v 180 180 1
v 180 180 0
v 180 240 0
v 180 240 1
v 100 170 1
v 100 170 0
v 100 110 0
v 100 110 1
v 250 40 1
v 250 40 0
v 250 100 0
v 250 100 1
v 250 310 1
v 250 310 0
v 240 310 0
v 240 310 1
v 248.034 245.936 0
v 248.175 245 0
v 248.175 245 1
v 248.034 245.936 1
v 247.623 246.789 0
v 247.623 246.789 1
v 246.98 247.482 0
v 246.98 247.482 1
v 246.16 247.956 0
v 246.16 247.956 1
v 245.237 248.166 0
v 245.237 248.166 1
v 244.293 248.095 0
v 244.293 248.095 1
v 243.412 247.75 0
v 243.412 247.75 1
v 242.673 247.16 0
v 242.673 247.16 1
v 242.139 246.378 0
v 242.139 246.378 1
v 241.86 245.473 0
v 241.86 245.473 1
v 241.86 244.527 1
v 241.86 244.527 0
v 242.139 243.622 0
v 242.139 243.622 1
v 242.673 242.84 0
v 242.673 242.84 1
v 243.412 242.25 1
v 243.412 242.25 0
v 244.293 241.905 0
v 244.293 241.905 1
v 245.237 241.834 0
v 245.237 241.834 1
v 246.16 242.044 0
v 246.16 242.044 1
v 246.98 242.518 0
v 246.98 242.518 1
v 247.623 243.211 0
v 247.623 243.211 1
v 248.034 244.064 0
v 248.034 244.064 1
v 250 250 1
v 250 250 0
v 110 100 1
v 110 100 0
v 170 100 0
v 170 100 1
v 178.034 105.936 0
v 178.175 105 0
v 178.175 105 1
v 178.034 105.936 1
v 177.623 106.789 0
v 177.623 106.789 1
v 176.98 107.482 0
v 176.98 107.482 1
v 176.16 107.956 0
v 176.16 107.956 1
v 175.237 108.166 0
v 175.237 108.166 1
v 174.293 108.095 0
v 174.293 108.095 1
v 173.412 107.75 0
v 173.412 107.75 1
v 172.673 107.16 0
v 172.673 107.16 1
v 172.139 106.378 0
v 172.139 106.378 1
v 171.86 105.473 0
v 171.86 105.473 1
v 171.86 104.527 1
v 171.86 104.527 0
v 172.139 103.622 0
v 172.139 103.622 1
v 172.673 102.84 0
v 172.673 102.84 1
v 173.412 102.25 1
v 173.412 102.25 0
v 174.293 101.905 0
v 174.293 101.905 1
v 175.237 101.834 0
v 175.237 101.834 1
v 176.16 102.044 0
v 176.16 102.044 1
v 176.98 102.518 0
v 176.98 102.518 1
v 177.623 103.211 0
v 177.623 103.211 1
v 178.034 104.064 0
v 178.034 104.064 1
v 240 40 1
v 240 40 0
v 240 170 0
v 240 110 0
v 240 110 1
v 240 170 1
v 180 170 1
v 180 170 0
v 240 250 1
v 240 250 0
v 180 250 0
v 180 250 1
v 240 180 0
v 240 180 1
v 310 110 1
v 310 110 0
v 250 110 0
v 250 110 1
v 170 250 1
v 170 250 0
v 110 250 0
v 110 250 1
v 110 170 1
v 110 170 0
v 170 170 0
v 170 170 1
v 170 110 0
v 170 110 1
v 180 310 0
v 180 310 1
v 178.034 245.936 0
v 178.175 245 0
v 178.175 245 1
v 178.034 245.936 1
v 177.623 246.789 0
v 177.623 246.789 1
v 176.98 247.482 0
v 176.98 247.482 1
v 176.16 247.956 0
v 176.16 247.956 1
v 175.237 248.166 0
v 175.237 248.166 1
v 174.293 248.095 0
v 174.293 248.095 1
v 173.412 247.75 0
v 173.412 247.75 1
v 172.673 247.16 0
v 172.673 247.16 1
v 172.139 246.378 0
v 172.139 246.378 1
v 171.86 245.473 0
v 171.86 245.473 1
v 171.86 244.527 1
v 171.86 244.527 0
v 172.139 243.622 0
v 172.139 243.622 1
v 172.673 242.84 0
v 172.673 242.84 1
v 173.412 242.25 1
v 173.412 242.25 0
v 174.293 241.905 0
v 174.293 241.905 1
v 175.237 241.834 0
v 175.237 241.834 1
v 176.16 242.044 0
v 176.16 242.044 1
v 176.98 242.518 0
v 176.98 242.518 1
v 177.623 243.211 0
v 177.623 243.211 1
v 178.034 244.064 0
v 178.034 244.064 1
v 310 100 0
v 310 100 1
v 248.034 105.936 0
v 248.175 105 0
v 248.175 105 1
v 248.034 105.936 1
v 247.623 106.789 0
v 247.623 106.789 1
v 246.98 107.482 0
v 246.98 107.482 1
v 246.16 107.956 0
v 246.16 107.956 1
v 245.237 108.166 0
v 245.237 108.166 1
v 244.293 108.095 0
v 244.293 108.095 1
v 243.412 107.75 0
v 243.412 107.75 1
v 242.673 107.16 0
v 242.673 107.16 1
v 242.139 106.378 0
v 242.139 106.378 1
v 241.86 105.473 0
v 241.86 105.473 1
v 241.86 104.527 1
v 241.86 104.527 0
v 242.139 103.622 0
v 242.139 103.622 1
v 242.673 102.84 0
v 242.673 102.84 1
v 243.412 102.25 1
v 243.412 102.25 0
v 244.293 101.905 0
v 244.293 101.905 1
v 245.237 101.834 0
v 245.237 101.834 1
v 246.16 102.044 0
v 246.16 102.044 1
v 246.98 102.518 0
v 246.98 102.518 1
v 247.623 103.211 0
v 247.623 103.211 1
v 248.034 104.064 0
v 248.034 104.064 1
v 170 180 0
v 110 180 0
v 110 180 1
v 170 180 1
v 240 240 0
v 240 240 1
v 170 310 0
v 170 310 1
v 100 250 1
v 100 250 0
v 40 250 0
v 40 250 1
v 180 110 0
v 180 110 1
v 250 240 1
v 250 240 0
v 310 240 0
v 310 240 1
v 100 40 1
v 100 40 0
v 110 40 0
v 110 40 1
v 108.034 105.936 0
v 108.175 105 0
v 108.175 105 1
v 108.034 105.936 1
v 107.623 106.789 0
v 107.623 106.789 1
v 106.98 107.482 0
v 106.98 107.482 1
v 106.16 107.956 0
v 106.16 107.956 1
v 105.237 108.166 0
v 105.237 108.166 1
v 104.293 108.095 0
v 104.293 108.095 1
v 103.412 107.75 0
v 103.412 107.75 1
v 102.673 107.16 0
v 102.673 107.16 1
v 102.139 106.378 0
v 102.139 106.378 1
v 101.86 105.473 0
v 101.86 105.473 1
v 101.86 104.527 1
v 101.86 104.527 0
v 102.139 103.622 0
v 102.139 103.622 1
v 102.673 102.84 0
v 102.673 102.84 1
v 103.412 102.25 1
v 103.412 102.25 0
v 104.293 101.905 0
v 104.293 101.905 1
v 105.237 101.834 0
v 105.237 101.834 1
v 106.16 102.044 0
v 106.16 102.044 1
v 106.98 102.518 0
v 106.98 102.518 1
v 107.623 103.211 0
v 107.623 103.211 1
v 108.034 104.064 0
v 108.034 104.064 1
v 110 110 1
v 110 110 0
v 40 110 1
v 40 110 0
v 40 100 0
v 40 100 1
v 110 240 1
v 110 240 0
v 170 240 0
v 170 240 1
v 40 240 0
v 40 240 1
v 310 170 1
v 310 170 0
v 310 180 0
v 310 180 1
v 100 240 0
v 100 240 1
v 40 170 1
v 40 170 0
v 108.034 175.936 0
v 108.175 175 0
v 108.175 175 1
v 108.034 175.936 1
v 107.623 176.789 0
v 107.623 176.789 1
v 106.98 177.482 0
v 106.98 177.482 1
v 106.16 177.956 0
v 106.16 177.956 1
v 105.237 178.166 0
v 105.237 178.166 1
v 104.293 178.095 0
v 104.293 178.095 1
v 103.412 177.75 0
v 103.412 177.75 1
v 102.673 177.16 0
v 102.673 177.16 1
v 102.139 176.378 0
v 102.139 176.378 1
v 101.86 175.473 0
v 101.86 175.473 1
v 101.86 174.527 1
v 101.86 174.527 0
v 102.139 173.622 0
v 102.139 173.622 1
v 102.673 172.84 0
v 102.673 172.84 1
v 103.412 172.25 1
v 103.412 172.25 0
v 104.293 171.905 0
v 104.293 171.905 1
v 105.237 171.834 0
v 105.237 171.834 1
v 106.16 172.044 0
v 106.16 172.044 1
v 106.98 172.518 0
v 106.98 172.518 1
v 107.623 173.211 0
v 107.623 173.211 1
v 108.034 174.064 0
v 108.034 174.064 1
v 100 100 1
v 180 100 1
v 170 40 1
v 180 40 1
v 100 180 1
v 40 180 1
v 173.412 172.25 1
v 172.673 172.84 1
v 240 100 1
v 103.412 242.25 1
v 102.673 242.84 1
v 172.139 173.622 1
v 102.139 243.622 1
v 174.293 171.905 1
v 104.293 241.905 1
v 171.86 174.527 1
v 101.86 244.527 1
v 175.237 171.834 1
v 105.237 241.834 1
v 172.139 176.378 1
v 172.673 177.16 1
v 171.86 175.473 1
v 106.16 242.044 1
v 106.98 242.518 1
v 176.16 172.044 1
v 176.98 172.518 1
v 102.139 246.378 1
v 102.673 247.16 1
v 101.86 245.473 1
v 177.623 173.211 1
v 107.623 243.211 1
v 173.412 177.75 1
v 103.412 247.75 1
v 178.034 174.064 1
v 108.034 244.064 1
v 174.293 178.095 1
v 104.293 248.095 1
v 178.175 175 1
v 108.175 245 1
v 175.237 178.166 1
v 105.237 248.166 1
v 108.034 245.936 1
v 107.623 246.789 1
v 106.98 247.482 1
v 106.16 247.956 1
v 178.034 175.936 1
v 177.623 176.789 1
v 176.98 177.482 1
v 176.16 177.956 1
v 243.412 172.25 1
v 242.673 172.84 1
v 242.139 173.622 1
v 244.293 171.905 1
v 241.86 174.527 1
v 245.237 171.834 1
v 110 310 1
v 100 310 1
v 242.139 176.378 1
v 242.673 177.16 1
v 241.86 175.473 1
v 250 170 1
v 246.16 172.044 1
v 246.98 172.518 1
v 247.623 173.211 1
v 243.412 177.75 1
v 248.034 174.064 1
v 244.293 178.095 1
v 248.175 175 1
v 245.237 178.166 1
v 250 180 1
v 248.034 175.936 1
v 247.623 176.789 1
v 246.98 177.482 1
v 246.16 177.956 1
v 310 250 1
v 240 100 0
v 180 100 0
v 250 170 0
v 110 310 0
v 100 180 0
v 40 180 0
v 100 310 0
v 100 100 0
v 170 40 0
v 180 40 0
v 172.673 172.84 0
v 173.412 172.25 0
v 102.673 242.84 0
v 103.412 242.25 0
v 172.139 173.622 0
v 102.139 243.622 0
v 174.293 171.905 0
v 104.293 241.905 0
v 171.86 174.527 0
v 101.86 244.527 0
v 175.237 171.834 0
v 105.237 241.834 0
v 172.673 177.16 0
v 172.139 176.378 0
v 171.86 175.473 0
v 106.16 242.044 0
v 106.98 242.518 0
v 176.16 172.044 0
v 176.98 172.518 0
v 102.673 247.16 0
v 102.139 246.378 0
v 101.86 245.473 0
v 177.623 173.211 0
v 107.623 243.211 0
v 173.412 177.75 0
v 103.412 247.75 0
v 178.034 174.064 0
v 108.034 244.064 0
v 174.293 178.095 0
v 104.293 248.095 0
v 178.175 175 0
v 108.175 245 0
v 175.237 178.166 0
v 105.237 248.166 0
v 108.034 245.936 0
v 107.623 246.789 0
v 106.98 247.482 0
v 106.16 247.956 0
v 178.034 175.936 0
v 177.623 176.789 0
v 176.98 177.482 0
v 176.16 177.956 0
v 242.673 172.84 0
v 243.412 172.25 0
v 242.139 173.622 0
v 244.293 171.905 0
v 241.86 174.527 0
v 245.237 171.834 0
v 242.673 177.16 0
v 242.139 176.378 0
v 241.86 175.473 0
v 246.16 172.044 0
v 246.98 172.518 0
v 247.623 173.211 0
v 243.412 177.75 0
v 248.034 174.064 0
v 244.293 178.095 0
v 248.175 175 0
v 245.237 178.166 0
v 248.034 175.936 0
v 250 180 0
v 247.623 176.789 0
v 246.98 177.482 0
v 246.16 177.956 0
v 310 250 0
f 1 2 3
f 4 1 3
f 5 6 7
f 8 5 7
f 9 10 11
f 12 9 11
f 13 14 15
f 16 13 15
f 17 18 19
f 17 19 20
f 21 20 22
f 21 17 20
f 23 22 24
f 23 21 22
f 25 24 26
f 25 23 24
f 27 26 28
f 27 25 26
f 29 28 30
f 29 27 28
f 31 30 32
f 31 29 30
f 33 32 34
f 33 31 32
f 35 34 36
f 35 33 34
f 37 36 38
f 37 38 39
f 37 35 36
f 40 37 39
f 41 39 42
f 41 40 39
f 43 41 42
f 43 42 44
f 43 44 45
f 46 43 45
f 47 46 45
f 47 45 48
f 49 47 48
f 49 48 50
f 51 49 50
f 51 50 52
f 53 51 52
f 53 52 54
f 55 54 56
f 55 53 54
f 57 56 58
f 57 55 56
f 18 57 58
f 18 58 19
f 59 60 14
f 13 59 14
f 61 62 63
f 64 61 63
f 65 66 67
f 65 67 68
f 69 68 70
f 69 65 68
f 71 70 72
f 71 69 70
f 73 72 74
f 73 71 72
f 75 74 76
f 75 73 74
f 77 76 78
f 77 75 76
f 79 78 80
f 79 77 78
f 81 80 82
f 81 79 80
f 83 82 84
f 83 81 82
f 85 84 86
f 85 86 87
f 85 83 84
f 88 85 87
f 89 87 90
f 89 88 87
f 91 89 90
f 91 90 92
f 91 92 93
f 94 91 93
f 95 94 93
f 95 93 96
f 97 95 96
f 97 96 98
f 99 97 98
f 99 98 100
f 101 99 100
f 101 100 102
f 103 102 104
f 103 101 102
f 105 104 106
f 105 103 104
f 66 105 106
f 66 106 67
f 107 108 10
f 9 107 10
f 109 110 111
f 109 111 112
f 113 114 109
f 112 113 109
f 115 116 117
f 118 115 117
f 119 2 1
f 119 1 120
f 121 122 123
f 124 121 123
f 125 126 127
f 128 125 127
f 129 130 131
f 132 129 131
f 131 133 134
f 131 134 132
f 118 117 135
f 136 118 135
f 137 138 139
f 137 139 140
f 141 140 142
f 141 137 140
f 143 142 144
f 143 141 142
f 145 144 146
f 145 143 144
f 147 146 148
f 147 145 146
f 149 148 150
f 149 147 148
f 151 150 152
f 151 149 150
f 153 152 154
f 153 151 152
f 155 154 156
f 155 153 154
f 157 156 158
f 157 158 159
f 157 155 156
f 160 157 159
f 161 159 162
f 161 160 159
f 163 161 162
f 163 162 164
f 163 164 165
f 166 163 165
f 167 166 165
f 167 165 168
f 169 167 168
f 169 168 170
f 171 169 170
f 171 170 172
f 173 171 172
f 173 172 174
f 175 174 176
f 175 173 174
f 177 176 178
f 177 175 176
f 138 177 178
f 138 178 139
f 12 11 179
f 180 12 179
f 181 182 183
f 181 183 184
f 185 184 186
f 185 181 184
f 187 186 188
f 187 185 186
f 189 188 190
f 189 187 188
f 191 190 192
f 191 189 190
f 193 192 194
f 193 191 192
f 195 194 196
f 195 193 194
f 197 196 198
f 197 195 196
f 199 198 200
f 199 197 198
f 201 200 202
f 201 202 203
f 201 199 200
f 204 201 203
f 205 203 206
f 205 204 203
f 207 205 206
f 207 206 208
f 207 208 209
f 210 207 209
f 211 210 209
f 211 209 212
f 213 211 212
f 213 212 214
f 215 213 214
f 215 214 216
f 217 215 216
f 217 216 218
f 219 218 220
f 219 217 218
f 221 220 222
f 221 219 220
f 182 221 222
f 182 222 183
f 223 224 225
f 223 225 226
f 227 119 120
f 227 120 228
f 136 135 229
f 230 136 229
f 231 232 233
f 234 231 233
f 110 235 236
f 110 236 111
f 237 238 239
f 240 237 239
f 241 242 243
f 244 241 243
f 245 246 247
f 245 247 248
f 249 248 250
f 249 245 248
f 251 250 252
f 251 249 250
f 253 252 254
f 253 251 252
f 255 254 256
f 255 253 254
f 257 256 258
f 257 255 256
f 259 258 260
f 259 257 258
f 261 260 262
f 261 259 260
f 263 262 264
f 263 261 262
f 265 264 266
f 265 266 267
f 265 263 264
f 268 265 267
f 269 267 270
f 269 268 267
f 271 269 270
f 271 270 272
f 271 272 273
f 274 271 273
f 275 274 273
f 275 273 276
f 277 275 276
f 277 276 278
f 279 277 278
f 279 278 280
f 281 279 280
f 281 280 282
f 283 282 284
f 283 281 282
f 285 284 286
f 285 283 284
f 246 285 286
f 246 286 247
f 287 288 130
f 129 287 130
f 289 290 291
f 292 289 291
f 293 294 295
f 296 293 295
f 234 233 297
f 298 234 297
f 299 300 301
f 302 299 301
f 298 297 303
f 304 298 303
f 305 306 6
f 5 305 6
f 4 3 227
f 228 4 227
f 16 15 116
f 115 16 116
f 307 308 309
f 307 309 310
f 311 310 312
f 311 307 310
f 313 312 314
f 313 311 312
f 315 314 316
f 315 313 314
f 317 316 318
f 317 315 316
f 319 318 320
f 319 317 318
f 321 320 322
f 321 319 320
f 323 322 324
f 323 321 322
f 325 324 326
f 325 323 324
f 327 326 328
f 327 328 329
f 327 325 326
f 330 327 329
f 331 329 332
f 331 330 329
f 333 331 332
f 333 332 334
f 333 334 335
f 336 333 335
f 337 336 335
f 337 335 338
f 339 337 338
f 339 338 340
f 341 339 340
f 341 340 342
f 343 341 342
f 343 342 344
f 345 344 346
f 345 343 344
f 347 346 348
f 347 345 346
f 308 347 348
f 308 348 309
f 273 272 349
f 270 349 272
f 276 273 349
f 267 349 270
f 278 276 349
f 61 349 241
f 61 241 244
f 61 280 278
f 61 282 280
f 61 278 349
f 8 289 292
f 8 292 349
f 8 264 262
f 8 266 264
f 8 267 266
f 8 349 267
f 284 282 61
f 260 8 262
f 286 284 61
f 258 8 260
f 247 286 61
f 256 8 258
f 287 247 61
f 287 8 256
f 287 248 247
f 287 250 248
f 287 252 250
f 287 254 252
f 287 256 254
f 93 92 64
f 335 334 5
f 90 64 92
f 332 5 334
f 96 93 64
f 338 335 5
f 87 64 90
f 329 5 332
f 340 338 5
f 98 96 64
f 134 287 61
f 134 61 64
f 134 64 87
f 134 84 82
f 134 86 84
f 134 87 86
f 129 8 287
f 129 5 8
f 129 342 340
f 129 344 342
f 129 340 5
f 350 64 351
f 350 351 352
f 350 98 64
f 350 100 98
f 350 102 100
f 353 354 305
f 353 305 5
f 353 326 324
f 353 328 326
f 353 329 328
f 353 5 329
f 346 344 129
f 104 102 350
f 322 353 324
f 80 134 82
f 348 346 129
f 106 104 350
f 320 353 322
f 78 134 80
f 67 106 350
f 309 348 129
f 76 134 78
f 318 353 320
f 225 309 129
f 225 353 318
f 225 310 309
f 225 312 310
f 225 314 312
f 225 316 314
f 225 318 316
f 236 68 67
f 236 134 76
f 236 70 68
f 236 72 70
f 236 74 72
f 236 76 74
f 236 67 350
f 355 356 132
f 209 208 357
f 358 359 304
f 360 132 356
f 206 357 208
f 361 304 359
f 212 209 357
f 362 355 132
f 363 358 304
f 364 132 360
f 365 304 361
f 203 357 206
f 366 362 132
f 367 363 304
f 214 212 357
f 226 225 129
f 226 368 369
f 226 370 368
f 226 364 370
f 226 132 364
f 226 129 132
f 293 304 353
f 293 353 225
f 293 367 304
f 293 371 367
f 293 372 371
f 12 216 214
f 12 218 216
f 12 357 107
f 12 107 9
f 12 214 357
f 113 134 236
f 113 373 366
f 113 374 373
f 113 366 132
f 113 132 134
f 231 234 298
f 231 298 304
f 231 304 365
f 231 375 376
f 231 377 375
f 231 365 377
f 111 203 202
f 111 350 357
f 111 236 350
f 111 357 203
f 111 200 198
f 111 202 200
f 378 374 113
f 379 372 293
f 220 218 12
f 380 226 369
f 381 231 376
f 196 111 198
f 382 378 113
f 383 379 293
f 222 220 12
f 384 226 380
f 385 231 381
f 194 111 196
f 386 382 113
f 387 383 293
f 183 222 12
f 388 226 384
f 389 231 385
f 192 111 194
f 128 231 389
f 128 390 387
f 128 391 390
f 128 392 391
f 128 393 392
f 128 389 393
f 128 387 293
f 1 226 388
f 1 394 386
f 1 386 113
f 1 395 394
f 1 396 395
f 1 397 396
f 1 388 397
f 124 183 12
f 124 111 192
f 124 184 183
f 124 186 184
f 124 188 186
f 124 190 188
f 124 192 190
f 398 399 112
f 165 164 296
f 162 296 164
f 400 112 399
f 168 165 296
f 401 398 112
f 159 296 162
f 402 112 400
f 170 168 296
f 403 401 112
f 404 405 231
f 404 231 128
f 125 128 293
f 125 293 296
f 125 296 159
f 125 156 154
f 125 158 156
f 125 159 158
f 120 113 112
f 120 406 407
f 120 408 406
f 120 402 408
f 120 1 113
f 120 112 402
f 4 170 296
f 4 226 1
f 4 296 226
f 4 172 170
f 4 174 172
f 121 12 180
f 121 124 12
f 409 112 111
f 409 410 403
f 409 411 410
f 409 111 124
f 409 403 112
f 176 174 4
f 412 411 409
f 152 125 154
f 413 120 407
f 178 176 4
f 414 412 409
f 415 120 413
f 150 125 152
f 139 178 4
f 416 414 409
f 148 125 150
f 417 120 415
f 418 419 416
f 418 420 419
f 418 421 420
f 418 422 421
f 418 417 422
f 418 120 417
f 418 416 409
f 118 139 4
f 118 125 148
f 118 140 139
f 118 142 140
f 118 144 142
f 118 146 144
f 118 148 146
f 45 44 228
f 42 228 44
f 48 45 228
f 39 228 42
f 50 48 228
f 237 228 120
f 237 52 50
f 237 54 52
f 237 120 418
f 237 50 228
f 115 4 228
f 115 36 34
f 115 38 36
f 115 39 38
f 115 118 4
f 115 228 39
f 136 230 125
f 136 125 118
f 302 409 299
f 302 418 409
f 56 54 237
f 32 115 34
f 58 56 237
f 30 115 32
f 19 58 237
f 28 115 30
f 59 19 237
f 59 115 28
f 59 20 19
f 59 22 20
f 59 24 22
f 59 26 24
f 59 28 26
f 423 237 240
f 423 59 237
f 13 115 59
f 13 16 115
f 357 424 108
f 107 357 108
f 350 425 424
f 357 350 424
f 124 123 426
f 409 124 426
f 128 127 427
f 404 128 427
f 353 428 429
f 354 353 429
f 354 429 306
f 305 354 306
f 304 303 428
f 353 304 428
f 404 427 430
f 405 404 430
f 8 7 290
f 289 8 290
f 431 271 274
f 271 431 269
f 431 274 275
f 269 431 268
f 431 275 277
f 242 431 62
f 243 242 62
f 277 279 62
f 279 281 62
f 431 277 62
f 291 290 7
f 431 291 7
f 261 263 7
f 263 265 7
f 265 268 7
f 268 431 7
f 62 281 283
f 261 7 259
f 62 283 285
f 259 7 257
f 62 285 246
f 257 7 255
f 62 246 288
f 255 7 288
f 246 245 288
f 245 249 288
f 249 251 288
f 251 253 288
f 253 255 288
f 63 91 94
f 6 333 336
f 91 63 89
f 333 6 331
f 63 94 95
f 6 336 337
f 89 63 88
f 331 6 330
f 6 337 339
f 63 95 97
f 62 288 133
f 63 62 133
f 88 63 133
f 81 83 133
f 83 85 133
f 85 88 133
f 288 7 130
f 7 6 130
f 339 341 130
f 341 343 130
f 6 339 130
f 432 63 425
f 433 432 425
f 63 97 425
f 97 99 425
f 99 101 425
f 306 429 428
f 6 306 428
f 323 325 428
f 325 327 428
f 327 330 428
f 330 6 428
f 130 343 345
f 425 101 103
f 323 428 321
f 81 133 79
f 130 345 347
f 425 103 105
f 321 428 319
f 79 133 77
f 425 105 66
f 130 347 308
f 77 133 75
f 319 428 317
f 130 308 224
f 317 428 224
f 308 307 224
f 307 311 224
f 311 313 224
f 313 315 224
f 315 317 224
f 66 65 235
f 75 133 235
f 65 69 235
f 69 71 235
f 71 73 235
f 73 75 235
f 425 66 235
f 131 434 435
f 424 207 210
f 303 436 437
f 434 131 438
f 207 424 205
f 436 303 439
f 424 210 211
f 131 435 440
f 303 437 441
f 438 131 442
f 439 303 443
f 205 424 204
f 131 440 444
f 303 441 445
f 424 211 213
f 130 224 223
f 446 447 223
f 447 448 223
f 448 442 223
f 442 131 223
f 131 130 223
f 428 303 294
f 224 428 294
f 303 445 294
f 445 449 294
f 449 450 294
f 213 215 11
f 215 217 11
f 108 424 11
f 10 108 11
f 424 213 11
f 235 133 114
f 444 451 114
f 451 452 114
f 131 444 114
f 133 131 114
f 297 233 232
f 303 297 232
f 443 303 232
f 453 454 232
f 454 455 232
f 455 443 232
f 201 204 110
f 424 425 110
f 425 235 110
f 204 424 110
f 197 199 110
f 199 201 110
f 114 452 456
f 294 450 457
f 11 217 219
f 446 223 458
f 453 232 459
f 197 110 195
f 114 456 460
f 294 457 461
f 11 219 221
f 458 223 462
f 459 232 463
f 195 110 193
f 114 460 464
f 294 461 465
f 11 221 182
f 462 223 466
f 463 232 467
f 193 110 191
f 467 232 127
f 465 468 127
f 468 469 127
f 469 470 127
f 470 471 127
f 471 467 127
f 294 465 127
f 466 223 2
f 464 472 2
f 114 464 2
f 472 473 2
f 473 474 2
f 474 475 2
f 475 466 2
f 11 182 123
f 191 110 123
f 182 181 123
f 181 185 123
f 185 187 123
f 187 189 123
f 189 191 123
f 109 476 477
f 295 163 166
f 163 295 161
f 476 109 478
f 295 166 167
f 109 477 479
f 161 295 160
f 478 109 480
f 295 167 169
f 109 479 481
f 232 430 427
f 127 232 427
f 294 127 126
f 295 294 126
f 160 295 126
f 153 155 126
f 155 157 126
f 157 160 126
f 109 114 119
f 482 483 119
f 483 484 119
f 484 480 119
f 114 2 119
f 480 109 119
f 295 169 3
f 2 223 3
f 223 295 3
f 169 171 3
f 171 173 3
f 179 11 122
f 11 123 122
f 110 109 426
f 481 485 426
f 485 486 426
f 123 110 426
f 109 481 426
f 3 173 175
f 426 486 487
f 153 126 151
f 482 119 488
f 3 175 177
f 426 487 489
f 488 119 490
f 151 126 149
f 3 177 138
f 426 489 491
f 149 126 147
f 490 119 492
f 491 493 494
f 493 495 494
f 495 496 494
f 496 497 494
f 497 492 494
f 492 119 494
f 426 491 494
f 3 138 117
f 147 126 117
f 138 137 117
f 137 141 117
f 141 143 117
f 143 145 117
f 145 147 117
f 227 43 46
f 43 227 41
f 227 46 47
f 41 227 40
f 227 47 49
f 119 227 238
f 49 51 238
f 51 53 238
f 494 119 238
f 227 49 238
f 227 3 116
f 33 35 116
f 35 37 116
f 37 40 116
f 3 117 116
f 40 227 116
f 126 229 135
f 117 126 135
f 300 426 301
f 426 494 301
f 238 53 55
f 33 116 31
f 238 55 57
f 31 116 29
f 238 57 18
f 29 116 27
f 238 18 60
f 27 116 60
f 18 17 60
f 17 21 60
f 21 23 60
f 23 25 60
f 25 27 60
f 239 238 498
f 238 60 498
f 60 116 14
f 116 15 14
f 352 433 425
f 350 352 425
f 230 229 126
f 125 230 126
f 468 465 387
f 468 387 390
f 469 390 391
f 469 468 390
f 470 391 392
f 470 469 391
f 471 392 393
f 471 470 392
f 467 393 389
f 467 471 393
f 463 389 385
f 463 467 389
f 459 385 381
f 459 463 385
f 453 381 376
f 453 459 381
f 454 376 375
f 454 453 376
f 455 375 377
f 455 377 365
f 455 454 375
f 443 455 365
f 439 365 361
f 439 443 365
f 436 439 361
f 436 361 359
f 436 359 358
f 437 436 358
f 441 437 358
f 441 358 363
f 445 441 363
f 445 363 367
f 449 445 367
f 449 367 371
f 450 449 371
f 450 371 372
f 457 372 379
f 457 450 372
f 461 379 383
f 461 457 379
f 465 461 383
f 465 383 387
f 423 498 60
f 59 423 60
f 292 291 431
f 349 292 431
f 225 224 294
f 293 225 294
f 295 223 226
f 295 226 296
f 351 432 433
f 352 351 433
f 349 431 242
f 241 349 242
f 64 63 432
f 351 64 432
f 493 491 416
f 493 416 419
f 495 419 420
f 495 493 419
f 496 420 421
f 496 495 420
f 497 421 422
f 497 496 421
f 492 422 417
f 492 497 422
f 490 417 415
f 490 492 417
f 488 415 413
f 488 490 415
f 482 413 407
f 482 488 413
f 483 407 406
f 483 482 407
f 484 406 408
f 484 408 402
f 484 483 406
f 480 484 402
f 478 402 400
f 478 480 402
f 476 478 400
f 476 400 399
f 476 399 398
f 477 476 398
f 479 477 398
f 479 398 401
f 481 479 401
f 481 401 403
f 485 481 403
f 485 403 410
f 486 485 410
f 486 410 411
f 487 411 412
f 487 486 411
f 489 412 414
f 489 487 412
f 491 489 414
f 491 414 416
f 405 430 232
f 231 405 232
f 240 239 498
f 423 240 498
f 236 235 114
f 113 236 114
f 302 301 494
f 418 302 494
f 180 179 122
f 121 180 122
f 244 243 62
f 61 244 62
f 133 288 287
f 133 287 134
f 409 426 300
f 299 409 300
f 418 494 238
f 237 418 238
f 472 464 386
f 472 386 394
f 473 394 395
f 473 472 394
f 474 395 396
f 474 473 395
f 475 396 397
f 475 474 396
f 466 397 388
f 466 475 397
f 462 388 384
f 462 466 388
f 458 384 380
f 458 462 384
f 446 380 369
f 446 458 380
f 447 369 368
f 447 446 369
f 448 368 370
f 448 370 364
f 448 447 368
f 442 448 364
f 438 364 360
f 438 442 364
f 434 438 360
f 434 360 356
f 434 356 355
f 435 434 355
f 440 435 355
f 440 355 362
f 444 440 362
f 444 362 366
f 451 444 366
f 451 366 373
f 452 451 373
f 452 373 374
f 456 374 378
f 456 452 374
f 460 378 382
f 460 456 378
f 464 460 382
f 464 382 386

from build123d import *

# Parameters (mm, degrees)
ESQUISSE1_R        = 3.175
ESQUISSE1_W        = 60
ESQUISSE1_H        = 60
BOSS_EXTRU_1_DEPTH = 1


with BuildPart() as part:
    # Esquisse1 → Boss.-Extru.1 (new body)
    with BuildSketch(Plane.XY):
        Polygon((110, 310), (100, 310), (100, 250), (40, 250), (40, 240), (100, 240), (100, 180), (40, 180), (40, 170), (100, 170), (100, 110), (40, 110), (40, 100), (100, 100), (100, 40), (110, 40), (110, 100), (170, 100), (170, 40), (180, 40), (180, 100), (240, 100), (240, 40), (250, 40), (250, 100), (310, 100), (310, 110), (250, 110), (250, 170), (310, 170), (310, 180), (250, 180), (250, 240), (310, 240), (310, 250), (250, 250), (250, 310), (240, 310), (240, 250), (180, 250), (180, 310), (170, 310), (170, 250), (110, 250), align=None)
        with Locations((105, 105)):
            Circle(ESQUISSE1_R, mode=Mode.SUBTRACT)
        with Locations((140, 140)):
            Rectangle(ESQUISSE1_W, ESQUISSE1_H, mode=Mode.SUBTRACT)
        with Locations((105, 175)):
            Circle(ESQUISSE1_R, mode=Mode.SUBTRACT)
        with Locations((140, 210)):
            Rectangle(ESQUISSE1_W, ESQUISSE1_H, mode=Mode.SUBTRACT)
        with Locations((105, 245)):
            Circle(ESQUISSE1_R, mode=Mode.SUBTRACT)
        with Locations((175, 245)):
            Circle(ESQUISSE1_R, mode=Mode.SUBTRACT)
        with Locations((175, 105)):
            Circle(ESQUISSE1_R, mode=Mode.SUBTRACT)
        with Locations((210, 140)):
            Rectangle(ESQUISSE1_W, ESQUISSE1_H, mode=Mode.SUBTRACT)
        with Locations((245, 105)):
            Circle(ESQUISSE1_R, mode=Mode.SUBTRACT)
        with Locations((175, 175)):
            Circle(ESQUISSE1_R, mode=Mode.SUBTRACT)
        with Locations((210, 210)):
            Rectangle(ESQUISSE1_W, ESQUISSE1_H, mode=Mode.SUBTRACT)
        with Locations((245, 175)):
            Circle(ESQUISSE1_R, mode=Mode.SUBTRACT)
        with Locations((245, 245)):
            Circle(ESQUISSE1_R, mode=Mode.SUBTRACT)
    extrude(amount=BOSS_EXTRU_1_DEPTH)


solid = part.part
